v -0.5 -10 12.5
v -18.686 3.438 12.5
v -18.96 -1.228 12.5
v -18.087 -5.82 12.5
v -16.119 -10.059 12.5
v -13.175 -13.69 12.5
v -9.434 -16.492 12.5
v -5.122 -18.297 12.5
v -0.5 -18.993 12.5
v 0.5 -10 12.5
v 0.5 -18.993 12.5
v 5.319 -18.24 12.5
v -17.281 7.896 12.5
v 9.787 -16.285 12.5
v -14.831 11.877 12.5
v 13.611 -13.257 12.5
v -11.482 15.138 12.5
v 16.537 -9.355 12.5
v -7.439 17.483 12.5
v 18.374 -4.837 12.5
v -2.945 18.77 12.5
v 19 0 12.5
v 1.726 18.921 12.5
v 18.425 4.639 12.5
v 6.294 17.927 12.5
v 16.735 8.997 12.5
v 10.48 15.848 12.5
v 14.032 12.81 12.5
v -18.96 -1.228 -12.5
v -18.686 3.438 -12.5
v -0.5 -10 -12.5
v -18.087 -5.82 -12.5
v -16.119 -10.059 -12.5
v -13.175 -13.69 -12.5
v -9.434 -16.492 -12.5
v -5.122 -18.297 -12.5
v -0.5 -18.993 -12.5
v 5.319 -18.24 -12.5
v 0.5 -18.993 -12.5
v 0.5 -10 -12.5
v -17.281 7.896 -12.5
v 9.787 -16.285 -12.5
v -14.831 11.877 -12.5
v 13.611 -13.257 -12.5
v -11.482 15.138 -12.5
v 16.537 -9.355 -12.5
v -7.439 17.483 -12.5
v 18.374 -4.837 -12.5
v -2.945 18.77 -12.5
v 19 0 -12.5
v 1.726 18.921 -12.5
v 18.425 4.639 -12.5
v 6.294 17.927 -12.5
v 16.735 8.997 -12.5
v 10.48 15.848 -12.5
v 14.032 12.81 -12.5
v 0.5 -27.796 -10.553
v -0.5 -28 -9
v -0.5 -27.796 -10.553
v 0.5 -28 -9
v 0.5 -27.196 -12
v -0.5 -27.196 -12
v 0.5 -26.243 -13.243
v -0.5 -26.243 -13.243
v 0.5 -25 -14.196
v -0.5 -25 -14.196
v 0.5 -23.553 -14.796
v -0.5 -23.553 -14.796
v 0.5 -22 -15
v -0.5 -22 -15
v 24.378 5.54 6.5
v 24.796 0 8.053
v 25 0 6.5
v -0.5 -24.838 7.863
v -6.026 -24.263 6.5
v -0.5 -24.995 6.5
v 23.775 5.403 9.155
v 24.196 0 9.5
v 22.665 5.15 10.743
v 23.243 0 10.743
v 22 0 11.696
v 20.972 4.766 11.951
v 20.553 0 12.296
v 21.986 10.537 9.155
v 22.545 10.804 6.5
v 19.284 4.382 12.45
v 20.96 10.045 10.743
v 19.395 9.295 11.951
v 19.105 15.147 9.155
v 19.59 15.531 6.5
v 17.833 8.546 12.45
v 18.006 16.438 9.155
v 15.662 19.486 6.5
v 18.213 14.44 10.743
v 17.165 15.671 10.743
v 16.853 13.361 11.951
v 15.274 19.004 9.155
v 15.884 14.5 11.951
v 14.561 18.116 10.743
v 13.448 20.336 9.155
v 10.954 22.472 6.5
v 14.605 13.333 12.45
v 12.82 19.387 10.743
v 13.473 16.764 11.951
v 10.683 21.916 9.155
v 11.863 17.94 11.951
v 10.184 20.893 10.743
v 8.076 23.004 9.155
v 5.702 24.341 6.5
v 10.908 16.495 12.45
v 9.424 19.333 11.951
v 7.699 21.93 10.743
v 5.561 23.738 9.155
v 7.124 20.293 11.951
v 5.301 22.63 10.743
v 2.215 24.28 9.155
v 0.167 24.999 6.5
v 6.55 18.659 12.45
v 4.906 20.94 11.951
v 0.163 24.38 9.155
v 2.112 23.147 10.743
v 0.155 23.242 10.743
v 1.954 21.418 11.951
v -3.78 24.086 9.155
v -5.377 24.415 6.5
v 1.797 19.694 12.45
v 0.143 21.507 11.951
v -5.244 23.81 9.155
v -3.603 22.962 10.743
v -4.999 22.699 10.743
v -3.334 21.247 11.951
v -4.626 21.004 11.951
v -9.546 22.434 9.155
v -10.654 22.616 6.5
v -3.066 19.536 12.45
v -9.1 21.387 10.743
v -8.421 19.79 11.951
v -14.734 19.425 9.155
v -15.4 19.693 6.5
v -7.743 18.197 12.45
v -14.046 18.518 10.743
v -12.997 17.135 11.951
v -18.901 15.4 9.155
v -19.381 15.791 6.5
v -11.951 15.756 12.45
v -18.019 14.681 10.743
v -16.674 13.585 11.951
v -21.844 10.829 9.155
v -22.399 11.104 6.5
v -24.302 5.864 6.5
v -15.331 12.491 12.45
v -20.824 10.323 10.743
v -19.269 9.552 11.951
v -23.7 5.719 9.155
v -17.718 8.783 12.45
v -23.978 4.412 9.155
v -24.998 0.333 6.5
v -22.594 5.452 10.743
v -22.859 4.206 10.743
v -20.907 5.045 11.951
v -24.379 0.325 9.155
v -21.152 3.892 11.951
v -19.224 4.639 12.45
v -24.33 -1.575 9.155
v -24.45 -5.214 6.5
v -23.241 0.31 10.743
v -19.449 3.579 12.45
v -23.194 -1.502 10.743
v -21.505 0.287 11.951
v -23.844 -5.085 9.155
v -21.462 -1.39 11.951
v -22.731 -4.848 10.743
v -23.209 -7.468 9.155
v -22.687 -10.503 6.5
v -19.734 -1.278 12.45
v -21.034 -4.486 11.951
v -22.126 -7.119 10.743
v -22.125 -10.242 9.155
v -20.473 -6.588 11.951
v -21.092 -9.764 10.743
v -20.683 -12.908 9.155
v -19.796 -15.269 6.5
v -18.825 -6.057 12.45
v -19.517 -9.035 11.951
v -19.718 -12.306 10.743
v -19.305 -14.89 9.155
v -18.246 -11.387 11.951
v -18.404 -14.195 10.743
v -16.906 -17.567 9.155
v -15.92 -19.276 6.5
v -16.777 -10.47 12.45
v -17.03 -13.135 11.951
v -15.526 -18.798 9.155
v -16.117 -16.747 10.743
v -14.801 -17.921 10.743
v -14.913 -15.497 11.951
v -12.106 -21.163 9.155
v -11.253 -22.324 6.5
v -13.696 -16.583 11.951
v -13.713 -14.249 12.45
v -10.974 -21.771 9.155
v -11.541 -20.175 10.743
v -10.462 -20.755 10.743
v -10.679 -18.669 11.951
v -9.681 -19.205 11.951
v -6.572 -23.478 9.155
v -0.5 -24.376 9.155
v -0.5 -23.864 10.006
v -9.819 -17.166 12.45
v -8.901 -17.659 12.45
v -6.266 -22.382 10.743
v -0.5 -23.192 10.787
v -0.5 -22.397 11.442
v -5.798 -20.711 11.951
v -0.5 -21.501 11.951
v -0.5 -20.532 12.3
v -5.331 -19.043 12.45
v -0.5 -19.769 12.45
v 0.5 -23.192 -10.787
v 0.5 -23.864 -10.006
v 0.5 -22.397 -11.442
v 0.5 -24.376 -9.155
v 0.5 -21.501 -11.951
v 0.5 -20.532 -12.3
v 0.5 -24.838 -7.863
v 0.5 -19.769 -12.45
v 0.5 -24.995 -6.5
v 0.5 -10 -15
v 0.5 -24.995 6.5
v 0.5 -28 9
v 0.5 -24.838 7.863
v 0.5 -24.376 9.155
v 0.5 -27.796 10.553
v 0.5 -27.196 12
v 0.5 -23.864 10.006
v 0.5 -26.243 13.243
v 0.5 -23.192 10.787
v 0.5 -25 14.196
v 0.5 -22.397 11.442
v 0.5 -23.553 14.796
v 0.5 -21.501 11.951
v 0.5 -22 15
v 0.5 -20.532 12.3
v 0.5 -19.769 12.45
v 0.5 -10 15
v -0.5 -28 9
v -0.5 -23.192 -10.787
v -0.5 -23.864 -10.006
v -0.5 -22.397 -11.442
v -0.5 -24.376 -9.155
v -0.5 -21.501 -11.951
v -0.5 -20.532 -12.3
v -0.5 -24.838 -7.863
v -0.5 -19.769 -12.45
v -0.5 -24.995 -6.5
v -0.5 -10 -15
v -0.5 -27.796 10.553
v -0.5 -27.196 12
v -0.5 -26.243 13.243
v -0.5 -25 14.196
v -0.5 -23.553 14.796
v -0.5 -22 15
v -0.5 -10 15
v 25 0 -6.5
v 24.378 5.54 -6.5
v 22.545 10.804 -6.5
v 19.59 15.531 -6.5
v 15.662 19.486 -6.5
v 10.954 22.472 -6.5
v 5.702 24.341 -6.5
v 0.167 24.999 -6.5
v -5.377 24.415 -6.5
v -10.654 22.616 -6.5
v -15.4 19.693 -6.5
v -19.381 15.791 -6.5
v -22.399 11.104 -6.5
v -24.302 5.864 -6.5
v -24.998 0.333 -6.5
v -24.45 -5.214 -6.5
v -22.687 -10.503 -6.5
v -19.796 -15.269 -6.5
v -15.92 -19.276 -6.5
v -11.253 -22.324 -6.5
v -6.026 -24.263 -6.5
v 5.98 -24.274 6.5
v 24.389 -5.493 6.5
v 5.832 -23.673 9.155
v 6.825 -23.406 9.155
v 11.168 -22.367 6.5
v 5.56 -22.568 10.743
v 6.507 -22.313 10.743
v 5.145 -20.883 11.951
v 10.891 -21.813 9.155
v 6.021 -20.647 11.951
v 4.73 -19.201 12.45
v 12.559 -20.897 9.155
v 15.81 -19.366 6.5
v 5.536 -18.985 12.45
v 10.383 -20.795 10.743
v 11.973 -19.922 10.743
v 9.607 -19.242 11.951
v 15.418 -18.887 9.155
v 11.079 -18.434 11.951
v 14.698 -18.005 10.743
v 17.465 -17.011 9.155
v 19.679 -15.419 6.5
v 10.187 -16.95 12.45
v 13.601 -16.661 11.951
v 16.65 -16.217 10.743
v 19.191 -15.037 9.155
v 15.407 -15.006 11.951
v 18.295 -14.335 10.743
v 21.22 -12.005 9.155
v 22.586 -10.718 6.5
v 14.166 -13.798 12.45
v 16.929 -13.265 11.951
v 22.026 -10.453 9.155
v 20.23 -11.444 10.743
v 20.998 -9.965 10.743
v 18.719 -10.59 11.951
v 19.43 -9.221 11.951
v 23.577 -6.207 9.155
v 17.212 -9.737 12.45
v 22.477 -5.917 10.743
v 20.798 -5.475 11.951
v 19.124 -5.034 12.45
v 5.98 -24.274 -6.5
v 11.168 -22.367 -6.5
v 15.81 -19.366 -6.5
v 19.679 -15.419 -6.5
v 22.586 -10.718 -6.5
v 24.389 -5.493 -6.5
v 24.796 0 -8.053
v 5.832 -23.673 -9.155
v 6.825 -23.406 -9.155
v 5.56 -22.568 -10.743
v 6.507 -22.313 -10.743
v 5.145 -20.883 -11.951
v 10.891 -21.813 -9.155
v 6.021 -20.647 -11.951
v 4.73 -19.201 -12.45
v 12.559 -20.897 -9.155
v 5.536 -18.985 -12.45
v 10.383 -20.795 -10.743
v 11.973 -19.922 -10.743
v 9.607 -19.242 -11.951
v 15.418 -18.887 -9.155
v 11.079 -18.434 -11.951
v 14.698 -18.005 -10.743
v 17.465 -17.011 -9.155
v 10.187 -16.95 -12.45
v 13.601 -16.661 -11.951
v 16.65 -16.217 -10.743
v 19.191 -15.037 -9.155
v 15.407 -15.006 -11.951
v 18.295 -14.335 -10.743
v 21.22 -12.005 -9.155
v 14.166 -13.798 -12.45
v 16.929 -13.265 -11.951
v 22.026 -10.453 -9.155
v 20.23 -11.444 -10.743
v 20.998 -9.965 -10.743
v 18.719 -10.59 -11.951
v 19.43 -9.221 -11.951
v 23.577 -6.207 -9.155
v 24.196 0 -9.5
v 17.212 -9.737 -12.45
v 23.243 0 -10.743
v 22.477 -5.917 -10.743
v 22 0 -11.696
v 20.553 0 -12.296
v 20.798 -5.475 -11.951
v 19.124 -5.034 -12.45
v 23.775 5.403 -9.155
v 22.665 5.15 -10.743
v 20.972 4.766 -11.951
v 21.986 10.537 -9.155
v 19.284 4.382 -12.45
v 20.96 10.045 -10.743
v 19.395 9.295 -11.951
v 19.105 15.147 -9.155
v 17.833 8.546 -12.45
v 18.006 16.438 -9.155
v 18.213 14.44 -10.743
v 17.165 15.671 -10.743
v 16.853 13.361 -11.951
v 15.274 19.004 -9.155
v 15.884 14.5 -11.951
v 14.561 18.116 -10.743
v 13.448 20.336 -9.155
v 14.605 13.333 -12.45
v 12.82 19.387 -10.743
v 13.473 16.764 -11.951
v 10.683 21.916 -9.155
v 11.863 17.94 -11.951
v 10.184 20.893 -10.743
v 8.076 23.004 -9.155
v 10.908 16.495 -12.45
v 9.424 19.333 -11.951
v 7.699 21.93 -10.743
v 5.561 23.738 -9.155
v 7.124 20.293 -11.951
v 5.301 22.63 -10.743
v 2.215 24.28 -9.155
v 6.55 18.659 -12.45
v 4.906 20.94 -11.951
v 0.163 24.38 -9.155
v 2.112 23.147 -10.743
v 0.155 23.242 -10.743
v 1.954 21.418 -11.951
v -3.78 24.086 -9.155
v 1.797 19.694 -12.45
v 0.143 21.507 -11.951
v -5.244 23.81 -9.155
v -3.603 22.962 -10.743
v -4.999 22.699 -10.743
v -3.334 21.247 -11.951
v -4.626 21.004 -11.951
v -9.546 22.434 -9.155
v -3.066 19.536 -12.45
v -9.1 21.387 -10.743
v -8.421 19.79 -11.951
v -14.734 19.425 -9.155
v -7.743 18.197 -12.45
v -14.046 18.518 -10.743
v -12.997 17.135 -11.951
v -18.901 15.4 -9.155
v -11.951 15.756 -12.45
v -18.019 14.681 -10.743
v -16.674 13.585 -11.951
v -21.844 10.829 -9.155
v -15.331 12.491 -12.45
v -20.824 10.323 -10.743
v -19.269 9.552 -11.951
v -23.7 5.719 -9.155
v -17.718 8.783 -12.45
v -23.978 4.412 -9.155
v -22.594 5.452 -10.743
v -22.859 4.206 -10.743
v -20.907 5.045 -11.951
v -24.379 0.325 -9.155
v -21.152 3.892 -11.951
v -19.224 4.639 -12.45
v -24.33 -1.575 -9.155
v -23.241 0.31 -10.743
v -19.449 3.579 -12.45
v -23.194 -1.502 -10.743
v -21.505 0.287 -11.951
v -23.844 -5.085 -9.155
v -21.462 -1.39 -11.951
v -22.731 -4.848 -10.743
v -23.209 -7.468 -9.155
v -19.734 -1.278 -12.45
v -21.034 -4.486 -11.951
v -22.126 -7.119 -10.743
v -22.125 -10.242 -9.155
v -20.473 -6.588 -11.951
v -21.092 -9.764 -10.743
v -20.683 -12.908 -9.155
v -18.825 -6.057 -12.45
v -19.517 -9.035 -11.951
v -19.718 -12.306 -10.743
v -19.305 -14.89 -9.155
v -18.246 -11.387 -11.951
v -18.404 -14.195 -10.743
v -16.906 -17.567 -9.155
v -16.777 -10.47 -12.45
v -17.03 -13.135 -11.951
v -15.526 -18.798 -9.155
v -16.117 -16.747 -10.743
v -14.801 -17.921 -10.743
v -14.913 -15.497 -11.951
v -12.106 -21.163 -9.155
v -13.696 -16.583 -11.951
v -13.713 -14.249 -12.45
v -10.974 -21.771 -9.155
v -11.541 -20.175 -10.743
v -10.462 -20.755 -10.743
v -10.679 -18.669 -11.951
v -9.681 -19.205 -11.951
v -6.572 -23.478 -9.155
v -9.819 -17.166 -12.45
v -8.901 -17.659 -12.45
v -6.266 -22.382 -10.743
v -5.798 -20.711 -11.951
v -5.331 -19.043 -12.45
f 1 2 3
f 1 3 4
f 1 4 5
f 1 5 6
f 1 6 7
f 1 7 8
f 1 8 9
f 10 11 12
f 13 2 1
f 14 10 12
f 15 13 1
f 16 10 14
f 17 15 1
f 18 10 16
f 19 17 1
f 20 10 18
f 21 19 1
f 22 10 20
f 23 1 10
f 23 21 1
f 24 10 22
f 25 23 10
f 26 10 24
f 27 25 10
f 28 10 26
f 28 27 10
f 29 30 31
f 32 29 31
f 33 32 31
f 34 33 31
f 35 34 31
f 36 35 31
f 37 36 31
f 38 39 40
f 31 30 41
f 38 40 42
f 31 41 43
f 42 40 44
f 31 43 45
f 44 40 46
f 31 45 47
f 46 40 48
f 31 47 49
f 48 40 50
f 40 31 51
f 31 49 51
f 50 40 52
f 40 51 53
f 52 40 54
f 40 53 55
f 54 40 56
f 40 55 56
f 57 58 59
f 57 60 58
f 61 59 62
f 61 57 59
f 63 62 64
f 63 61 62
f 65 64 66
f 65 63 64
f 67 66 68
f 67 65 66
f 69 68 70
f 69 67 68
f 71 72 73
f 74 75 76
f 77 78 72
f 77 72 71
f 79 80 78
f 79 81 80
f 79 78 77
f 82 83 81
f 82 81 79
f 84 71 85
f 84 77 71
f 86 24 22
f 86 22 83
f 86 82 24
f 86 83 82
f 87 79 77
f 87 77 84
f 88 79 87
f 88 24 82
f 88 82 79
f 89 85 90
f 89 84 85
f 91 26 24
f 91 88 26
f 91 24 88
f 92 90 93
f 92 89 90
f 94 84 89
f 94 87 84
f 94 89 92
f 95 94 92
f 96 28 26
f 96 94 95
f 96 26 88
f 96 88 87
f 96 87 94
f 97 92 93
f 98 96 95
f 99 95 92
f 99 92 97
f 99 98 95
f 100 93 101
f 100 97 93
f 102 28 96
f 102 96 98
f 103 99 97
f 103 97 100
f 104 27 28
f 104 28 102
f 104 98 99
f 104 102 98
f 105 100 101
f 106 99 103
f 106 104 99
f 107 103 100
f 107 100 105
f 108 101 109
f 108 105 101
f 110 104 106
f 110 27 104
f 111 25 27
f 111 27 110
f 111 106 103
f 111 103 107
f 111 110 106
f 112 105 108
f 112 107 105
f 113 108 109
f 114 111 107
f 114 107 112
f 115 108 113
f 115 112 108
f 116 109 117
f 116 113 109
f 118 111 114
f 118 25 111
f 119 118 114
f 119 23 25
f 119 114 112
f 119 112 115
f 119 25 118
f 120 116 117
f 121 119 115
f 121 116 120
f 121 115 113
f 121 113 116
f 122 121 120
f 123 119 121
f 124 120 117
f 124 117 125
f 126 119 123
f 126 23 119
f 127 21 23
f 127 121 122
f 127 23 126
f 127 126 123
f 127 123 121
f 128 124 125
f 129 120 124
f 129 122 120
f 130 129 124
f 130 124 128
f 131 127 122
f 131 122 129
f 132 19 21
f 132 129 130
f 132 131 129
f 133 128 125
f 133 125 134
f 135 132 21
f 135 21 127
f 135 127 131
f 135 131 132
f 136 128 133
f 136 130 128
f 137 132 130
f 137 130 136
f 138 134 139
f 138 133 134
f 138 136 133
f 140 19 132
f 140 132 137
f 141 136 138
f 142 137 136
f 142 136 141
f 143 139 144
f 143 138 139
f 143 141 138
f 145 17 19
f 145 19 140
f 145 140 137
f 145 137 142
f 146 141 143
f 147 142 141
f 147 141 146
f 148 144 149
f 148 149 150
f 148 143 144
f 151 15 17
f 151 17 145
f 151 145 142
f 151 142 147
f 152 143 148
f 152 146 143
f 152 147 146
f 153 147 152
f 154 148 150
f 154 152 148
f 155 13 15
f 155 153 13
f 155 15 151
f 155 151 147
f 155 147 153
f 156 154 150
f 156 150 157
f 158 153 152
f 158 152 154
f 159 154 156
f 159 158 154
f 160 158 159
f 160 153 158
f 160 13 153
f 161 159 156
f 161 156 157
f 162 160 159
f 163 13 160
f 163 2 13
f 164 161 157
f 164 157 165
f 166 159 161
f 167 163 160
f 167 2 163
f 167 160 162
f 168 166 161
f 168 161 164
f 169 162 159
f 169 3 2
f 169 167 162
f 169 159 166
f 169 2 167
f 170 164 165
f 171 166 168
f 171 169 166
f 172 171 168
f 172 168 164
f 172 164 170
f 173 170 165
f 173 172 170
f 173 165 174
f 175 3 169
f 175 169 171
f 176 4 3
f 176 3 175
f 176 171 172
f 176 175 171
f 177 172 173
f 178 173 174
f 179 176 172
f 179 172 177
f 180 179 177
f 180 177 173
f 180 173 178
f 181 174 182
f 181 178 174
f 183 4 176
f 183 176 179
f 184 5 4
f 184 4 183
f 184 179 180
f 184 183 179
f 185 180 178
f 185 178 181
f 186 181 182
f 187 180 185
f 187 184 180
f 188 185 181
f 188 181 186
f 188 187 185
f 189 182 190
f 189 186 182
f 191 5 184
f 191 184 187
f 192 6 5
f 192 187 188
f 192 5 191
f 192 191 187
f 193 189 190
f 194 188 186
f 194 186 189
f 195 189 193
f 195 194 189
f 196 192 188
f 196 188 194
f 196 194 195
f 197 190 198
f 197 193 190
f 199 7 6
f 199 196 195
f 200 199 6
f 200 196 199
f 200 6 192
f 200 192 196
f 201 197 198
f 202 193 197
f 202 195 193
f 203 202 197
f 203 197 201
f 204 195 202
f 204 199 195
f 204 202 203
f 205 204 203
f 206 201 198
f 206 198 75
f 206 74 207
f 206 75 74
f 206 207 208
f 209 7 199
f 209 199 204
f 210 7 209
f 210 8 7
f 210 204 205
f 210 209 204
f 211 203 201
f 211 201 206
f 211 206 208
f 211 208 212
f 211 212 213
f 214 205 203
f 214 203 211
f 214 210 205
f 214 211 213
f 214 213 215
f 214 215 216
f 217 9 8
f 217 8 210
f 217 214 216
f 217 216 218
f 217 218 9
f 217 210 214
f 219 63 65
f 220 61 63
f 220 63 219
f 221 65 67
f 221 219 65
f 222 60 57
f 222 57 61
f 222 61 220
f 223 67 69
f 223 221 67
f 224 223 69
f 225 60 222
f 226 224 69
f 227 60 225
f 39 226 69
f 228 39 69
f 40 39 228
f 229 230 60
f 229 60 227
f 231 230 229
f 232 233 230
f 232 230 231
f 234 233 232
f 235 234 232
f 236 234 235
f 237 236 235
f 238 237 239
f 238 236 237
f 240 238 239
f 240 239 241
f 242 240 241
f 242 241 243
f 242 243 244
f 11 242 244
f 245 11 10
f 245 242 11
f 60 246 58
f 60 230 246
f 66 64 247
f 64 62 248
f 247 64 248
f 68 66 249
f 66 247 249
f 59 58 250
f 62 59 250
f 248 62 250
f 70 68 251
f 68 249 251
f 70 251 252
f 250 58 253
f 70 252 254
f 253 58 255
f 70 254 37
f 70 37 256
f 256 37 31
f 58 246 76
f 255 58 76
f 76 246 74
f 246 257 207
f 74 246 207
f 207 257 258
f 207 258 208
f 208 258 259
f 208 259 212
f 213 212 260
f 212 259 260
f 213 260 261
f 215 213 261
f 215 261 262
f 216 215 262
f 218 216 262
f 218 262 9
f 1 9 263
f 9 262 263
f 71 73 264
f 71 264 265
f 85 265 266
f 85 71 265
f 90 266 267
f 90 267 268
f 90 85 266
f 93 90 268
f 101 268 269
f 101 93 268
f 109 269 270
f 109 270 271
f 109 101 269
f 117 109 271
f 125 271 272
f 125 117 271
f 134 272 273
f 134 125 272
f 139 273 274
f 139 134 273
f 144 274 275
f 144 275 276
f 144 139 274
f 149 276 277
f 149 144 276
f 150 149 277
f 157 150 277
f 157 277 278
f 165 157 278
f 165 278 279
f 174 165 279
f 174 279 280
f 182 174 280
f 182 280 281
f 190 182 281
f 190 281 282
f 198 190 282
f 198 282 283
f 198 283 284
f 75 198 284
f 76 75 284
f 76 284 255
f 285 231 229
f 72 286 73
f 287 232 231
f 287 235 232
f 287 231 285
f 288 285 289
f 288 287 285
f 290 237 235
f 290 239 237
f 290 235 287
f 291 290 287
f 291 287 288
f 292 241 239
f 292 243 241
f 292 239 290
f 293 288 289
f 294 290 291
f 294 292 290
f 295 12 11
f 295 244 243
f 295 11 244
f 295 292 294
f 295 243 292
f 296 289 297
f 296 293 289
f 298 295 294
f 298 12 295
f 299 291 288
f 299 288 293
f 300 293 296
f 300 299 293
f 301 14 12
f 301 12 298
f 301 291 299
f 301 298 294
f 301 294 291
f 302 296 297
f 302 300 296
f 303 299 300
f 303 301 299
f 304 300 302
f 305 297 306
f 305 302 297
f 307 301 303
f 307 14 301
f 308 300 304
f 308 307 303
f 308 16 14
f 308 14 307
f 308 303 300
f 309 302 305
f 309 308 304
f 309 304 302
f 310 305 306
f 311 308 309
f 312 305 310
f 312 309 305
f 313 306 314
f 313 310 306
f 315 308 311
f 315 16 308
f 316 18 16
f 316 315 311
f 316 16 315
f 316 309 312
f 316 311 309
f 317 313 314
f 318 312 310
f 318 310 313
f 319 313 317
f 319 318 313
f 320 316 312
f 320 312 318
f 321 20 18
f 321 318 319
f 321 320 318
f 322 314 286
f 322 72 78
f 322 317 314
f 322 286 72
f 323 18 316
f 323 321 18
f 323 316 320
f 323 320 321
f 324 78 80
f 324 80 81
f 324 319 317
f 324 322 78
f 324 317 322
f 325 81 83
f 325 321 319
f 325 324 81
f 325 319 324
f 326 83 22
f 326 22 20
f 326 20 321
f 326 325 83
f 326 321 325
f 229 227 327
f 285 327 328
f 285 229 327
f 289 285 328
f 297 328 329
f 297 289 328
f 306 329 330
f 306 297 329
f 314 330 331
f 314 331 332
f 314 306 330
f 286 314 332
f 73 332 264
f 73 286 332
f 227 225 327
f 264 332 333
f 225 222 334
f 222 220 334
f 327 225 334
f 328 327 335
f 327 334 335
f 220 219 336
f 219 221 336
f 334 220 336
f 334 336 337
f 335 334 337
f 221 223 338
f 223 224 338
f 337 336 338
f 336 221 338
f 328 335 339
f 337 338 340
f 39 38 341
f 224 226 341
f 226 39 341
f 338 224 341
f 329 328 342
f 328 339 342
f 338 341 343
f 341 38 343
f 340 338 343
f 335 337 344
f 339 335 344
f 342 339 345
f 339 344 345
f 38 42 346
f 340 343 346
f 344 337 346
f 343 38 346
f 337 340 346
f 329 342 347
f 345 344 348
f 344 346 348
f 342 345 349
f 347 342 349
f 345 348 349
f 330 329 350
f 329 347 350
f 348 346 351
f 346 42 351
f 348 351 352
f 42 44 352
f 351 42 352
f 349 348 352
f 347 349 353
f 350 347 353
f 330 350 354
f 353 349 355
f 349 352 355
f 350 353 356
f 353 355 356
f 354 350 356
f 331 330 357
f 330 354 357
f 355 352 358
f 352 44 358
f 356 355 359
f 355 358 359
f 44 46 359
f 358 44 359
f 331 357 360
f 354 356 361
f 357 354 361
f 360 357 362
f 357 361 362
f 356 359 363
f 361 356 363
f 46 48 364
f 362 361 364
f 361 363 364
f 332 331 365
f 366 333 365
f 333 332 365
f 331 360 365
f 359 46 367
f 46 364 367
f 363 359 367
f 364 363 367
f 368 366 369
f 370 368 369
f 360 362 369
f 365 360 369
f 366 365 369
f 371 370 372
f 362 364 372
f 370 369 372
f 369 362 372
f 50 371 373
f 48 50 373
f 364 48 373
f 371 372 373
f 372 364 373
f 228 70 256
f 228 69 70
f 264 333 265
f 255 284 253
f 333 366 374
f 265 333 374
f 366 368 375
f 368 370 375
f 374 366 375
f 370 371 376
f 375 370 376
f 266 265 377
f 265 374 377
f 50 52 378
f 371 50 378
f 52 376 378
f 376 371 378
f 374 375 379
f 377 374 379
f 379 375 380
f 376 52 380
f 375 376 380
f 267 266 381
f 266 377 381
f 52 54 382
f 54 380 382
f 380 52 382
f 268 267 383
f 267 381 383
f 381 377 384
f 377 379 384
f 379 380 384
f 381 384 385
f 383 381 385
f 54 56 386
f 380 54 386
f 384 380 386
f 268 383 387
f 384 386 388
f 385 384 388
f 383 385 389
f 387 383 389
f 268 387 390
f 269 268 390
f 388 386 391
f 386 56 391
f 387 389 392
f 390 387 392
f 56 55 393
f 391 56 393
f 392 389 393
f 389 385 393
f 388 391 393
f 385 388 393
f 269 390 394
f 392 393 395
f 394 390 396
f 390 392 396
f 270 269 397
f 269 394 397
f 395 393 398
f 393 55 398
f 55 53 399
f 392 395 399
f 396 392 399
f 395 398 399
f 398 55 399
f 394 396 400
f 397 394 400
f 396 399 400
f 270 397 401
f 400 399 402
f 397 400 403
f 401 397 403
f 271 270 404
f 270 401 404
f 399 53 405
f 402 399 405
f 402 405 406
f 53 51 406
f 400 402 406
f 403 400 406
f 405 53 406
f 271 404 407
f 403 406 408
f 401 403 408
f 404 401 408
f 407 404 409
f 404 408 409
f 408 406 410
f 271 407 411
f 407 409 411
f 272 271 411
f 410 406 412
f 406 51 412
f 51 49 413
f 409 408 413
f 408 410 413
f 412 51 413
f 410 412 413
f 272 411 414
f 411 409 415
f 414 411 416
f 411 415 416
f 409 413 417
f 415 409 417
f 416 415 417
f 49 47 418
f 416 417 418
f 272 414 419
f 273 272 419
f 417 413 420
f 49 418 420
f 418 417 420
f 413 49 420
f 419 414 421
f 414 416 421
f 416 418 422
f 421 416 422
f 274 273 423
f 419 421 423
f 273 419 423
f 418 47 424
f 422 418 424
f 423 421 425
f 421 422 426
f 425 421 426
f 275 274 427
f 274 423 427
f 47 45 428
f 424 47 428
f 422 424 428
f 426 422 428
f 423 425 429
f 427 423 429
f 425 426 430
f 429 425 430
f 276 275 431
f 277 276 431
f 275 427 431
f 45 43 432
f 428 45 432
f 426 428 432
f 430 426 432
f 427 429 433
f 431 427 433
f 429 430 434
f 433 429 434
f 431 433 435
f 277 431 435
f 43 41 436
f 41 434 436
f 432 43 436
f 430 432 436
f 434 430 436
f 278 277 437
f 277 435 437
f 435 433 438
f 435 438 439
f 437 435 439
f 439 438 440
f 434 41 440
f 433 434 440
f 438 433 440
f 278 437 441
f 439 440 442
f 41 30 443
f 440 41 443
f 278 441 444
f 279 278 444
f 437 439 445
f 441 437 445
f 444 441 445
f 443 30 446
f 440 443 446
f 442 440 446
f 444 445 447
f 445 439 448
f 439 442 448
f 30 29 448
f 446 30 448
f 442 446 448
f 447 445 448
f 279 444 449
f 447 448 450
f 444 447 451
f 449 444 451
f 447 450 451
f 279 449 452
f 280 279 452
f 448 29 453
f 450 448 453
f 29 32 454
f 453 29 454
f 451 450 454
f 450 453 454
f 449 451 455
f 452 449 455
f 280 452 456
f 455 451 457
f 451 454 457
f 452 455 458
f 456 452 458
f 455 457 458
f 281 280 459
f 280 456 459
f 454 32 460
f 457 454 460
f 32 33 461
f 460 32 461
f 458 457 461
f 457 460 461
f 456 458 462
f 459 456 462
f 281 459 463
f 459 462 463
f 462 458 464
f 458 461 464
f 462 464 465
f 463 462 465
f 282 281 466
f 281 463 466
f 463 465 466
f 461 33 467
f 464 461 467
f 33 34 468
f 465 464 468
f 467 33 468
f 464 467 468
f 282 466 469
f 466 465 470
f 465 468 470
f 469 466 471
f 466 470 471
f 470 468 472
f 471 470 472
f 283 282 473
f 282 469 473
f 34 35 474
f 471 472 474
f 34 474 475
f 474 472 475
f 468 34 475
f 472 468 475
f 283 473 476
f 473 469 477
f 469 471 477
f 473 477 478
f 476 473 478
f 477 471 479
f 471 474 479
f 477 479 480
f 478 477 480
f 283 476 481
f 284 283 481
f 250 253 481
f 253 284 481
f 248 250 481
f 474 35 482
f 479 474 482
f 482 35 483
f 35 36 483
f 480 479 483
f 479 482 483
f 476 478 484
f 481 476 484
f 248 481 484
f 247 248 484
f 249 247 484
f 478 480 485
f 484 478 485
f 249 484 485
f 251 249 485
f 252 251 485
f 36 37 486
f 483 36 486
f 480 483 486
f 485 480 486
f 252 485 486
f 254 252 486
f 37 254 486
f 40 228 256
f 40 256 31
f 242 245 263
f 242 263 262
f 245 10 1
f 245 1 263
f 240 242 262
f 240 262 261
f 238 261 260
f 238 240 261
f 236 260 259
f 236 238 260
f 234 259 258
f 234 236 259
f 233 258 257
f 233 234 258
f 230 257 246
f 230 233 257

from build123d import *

# Parameters (mm, degrees)
F0_R     = 25
F1_DEPTH = 12.5
F2_R     = 6
F4_DEPTH = 0.5


with BuildPart() as f1:
    # F0 (on Top) → F1 (new body, symmetric)
    with BuildSketch(Plane.XY):
        Circle(F0_R)
    extrude(amount=F1_DEPTH, both=True)

    # F2
    f2_edges = [f1.edges().sort_by_distance(p)[0] for p in [
        (-25, 0, 12.5),
        (-25, 0, -12.5),
    ]]
    fillet(f2_edges, radius=F2_R)

    # F3 (on Right) → F4 (join, symmetric)
    with BuildSketch(Plane.YZ):
        with BuildLine():
            Line((-22, -15), (-10, -15))
            Line((-10, -15), (-10, 15))
            Line((-10, 15), (-22, 15))
            ThreePointArc((-22, 15), (-26.242641, 13.242641), (-28, 9))
            Line((-28, 9), (-28, -9))
            ThreePointArc((-28, -9), (-26.242641, -13.242641), (-22, -15))
        make_face()
    extrude(amount=F4_DEPTH, both=True)


solid = f1.part
